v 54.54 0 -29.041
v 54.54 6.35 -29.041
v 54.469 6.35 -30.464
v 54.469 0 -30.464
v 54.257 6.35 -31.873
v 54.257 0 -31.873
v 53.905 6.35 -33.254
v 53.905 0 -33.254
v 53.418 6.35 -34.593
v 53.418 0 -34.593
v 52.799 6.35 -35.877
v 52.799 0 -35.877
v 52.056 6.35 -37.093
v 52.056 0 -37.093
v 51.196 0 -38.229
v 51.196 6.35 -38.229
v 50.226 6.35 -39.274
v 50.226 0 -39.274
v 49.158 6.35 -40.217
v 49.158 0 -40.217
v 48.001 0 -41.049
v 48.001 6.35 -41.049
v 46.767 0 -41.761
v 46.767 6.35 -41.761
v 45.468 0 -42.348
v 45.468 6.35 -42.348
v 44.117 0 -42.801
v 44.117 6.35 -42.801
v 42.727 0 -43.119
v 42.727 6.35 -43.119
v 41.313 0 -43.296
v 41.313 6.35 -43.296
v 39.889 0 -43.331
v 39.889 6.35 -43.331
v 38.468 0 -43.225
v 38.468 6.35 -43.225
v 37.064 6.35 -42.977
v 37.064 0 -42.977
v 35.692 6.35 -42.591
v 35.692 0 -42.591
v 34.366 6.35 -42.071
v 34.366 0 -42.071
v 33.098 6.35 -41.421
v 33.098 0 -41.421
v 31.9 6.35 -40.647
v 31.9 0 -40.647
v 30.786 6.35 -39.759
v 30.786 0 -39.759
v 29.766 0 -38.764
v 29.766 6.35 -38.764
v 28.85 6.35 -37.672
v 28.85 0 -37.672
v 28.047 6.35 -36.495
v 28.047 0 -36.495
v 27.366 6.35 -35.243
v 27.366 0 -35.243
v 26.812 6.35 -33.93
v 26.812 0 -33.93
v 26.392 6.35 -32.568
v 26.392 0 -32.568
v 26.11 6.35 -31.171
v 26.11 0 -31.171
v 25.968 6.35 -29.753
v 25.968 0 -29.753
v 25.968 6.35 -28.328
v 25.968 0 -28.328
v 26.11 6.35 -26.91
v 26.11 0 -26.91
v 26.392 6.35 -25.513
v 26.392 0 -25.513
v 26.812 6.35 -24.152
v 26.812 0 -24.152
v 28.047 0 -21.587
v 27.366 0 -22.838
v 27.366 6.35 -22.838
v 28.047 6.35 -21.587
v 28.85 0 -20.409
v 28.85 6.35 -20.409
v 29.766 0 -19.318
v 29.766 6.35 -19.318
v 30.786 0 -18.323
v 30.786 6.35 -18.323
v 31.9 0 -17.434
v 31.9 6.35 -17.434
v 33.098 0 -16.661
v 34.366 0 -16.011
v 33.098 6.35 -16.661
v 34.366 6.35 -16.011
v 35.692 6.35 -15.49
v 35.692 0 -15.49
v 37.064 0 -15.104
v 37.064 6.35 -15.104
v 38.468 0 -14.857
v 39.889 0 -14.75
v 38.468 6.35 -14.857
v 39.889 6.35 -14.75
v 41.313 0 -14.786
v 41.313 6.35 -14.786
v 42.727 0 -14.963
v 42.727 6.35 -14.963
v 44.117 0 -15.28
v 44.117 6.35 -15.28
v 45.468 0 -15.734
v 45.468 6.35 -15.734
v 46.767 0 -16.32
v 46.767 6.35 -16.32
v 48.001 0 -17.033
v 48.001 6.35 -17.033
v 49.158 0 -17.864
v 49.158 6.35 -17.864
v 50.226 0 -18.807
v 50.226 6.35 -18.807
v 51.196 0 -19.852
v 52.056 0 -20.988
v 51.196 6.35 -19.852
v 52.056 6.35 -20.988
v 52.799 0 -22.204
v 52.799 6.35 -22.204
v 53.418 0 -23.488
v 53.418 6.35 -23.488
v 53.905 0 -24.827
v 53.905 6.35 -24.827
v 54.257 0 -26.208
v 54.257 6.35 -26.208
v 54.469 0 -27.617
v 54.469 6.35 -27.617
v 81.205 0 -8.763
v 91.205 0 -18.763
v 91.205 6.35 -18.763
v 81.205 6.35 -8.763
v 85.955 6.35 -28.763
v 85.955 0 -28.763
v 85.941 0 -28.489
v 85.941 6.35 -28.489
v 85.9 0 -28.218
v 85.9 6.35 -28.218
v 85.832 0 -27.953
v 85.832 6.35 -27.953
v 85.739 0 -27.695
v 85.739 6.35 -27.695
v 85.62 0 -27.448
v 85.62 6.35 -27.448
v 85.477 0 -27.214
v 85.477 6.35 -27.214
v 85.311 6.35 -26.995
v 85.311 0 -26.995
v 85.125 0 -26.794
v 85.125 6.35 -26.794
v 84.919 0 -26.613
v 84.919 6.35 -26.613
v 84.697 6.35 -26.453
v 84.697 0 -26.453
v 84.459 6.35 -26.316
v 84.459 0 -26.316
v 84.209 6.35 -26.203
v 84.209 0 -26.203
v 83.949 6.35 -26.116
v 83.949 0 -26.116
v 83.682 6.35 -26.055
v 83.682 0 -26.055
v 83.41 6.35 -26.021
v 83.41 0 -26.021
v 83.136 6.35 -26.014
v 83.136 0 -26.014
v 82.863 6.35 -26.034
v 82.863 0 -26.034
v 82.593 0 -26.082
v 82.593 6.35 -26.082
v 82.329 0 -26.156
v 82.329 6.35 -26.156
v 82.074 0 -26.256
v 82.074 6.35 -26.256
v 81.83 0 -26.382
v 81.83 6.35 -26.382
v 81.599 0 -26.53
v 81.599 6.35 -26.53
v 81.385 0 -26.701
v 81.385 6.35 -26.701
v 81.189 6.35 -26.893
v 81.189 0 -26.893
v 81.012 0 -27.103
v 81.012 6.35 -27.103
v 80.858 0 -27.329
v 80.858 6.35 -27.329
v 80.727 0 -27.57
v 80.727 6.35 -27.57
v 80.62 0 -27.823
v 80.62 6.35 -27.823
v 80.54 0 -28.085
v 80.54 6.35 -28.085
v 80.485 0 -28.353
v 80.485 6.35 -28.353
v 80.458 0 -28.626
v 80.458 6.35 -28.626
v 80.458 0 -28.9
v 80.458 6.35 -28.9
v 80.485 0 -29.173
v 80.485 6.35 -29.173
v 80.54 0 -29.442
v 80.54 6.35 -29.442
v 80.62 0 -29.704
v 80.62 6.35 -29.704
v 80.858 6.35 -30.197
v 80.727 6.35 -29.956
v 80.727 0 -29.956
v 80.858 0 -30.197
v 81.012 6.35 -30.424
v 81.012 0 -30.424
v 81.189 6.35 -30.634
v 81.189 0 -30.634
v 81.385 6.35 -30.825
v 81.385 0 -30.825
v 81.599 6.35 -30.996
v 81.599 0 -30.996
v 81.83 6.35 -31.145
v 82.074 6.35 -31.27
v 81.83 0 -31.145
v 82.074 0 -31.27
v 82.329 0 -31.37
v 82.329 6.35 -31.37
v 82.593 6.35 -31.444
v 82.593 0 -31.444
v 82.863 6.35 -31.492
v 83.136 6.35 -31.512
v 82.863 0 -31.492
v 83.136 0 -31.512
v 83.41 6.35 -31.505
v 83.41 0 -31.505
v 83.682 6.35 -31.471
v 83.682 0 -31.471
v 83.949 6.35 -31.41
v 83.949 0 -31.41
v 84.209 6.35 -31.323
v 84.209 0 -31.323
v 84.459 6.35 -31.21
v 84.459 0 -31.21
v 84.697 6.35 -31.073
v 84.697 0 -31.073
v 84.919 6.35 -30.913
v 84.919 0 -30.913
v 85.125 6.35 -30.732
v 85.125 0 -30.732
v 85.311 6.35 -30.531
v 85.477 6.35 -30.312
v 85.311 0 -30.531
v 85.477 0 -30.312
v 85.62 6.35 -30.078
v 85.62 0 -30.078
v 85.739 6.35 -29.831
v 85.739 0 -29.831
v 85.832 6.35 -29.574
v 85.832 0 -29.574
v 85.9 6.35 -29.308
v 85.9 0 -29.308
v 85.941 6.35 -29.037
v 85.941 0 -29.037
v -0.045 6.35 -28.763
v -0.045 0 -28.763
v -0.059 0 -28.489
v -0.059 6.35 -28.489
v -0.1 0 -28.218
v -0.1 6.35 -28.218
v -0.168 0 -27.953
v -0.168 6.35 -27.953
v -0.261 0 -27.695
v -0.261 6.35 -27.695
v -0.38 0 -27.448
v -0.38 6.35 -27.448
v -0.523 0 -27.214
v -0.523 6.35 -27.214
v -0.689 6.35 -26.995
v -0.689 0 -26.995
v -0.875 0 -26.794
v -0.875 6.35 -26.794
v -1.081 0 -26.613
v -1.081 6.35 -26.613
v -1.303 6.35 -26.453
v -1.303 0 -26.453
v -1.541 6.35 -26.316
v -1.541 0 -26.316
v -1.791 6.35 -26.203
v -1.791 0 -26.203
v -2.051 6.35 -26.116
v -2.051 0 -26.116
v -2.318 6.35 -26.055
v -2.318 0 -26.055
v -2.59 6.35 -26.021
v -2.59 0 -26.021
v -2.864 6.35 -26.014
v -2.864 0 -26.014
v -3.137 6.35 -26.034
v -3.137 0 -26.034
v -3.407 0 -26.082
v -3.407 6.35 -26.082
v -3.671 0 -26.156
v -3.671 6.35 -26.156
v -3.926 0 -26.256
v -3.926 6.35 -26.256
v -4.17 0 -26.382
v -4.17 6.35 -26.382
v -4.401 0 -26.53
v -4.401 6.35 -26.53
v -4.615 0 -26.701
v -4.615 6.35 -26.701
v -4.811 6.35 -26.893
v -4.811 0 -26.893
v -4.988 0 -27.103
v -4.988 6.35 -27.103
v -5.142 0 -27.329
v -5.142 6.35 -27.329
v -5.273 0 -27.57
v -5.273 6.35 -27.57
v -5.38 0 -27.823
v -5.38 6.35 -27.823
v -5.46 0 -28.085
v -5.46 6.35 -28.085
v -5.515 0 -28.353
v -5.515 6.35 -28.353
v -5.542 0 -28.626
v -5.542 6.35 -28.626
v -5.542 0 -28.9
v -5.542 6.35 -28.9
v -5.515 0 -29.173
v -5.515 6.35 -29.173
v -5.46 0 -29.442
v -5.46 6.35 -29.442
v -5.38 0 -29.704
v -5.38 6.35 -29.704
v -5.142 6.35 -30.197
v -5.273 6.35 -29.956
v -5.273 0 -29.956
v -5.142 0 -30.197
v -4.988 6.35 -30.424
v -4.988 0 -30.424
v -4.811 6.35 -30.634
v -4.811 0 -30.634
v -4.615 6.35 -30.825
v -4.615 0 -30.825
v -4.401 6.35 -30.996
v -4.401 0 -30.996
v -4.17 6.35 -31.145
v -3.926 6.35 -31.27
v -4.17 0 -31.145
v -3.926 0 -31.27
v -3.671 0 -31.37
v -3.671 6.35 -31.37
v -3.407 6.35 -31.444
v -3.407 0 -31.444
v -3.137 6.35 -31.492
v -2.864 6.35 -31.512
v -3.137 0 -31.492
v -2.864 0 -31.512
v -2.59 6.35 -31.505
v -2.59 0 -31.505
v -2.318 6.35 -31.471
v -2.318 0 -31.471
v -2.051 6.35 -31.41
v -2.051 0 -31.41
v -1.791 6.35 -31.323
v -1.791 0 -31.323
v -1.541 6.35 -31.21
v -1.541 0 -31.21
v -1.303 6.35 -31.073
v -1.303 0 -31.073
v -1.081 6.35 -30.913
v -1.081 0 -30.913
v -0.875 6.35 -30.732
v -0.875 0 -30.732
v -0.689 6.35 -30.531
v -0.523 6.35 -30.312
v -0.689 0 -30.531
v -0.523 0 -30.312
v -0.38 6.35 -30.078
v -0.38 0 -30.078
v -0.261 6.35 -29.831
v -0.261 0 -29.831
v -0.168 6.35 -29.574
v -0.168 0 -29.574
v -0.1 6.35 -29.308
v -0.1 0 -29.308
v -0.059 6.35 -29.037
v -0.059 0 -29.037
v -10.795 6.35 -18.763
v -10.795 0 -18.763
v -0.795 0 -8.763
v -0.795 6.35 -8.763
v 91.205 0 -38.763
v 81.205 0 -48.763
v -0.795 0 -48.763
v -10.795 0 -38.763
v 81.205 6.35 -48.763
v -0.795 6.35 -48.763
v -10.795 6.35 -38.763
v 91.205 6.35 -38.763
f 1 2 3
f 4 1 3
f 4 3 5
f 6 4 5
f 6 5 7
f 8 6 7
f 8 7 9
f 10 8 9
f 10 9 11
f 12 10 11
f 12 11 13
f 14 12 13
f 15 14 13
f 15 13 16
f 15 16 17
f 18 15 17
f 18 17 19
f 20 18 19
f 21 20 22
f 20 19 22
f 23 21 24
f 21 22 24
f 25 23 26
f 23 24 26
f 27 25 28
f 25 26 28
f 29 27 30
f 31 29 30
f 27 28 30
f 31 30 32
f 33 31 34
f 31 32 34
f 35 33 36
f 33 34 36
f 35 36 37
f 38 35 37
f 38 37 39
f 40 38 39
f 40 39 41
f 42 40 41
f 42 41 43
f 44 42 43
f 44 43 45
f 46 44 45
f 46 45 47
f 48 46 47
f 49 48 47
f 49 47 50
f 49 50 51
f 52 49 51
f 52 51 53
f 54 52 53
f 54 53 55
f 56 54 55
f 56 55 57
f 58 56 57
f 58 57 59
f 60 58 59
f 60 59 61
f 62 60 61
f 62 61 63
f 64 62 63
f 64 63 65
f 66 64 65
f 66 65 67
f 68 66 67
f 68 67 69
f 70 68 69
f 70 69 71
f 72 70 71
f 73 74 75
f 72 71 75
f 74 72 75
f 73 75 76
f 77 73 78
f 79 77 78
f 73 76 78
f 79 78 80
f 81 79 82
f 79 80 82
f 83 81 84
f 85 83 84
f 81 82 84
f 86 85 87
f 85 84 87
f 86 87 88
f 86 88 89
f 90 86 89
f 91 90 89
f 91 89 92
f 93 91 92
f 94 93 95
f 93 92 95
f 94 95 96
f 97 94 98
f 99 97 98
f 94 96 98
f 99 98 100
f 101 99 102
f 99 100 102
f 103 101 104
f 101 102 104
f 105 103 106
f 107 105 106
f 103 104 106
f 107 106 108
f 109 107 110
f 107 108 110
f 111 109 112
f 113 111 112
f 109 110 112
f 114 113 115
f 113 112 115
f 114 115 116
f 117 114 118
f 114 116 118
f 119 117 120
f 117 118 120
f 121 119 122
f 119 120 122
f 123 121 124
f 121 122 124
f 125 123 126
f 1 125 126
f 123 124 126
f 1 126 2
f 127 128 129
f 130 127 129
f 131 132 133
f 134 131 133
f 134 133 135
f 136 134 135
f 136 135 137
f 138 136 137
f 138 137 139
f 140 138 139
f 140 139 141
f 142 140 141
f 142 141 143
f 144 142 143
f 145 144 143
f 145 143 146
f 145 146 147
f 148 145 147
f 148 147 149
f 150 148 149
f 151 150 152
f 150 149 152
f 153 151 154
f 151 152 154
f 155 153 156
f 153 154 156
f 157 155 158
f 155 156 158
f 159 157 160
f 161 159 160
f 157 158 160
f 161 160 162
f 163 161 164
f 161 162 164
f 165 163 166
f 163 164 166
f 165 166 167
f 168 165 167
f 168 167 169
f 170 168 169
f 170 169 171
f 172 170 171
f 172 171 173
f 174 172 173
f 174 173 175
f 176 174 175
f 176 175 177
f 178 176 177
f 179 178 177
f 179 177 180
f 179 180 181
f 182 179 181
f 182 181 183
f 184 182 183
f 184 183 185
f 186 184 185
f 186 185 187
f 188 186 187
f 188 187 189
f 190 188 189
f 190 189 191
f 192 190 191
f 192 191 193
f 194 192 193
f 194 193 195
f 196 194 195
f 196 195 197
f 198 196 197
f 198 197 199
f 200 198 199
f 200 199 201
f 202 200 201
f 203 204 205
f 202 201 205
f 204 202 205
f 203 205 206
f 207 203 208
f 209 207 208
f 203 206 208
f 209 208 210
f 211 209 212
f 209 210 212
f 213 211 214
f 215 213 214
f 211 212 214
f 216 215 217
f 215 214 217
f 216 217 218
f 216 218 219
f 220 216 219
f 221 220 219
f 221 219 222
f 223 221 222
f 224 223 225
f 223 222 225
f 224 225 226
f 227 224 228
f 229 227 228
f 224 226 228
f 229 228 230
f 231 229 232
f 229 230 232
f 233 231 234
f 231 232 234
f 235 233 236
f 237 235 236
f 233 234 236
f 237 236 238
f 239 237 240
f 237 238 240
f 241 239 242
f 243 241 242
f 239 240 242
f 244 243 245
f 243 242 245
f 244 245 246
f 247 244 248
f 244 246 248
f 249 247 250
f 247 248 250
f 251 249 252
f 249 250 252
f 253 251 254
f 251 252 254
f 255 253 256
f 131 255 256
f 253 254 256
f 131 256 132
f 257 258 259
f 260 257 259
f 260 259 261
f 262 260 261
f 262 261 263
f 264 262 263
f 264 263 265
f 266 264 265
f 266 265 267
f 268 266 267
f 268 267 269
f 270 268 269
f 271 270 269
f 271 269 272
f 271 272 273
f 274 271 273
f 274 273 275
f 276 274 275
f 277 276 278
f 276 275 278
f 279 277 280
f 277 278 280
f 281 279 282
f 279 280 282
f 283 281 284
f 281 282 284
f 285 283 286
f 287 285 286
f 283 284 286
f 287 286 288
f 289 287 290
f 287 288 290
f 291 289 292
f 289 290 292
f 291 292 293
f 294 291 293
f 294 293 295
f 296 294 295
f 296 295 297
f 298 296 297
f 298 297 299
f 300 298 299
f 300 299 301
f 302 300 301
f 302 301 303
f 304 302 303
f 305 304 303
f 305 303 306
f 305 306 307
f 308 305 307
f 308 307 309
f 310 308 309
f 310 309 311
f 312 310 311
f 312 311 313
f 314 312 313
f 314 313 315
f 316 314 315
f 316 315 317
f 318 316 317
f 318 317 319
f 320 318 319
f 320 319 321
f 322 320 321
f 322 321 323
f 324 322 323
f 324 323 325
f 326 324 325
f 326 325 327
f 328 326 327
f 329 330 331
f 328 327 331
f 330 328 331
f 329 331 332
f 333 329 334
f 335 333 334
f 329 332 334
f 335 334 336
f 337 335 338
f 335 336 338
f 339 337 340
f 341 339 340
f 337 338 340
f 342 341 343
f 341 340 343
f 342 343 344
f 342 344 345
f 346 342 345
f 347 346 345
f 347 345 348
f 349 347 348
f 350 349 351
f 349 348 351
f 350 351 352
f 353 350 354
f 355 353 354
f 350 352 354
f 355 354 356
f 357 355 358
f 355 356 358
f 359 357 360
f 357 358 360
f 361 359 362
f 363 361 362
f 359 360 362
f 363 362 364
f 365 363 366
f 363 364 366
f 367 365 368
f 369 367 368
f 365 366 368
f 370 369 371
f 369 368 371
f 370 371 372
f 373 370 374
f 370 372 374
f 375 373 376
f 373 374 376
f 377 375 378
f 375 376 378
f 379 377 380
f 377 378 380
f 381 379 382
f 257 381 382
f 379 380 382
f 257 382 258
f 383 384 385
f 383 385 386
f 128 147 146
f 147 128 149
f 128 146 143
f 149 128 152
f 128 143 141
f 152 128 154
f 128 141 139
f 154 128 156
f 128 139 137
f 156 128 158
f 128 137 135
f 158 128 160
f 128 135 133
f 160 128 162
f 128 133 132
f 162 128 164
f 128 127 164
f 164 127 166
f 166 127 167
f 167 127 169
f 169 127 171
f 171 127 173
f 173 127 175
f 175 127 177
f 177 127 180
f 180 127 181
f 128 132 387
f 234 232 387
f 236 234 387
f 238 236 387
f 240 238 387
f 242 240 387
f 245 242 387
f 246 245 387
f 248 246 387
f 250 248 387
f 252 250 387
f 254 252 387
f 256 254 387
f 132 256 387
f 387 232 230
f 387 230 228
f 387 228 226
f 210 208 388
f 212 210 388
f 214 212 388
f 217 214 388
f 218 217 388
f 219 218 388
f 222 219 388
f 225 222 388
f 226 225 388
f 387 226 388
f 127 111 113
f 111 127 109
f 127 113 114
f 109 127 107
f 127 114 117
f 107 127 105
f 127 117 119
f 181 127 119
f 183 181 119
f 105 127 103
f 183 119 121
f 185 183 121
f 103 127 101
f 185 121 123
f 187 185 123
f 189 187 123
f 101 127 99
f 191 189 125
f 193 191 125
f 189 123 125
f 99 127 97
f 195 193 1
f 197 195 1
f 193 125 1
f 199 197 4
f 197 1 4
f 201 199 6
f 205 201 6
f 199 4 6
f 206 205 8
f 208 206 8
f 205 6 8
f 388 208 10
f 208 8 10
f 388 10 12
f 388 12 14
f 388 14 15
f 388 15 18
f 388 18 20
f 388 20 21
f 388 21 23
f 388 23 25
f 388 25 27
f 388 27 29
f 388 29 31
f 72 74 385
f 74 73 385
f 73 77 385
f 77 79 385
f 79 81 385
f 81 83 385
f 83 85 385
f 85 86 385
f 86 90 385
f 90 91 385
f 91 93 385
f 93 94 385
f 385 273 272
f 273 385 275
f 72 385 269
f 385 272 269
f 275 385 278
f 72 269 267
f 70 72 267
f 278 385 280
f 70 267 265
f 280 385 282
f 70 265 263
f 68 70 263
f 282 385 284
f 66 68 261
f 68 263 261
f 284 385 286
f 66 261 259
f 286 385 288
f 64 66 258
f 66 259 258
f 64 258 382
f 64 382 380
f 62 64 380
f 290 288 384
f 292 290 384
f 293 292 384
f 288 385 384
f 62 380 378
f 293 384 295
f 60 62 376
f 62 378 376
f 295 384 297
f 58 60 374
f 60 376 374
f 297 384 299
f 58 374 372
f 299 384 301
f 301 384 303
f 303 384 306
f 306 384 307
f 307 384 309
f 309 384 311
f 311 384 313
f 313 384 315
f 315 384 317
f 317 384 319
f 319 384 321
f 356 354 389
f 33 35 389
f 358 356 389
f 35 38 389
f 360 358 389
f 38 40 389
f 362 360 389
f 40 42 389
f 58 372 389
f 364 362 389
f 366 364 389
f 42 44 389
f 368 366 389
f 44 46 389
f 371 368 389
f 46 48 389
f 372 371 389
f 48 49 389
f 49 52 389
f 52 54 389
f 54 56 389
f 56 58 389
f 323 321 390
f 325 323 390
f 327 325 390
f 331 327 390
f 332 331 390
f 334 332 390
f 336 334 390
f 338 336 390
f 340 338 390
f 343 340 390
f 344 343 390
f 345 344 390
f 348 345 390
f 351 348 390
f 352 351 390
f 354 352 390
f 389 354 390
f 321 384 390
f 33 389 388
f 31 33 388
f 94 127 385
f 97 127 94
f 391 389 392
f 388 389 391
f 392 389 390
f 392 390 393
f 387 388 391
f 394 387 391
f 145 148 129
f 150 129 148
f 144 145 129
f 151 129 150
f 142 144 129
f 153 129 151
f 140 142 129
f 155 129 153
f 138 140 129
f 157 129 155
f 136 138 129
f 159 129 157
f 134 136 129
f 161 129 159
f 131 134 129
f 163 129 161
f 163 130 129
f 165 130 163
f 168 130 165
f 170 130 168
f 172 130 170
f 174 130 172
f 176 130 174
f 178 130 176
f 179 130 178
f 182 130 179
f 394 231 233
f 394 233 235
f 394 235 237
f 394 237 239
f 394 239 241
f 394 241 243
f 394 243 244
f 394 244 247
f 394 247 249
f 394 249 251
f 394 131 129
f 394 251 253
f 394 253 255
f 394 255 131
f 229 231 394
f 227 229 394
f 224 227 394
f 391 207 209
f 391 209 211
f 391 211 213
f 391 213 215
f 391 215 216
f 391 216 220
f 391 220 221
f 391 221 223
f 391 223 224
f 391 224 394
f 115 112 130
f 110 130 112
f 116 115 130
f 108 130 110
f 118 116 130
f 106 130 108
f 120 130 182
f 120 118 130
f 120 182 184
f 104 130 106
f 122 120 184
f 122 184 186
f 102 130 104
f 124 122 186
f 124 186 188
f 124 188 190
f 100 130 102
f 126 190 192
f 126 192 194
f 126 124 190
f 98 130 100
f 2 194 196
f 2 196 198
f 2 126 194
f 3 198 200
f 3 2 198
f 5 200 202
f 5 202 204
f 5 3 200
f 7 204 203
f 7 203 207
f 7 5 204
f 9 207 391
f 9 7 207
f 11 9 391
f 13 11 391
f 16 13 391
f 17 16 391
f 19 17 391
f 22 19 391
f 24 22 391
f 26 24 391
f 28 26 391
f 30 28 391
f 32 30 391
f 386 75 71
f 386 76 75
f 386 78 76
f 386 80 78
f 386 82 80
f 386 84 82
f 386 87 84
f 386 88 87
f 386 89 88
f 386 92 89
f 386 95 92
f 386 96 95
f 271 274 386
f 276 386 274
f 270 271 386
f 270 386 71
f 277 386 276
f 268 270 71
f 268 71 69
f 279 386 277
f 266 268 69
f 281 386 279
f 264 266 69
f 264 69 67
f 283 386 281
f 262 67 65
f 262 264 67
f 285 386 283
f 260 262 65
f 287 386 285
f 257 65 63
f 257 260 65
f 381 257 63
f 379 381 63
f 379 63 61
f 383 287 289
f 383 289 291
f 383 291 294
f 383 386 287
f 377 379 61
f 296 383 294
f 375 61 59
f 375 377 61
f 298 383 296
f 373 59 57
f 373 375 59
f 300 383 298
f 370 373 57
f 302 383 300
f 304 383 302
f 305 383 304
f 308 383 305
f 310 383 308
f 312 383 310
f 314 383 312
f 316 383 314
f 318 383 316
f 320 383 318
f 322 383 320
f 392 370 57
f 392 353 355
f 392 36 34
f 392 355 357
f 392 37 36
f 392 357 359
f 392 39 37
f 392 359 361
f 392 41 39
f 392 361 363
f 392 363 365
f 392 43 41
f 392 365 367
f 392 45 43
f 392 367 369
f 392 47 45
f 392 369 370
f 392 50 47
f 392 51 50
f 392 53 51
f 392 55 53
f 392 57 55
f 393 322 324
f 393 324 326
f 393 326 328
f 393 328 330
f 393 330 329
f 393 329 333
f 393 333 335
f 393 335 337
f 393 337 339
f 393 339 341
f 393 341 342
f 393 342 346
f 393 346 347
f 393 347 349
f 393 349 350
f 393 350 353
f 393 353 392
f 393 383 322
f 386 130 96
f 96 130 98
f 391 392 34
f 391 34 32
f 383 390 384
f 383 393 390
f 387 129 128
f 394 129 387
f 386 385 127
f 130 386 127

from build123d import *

# Parameters (mm, degrees)
SKETCH1_W           = 82
SKETCH1_H           = 70
BOSS_EXTRUDE1_DEPTH = 6.35
SKETCH4_R           = 14.295
CUT_EXTRUDE3_DEPTH  = 7.35
SKETCH7_W           = 70
SKETCH7_H           = 6.35
BOSS_EXTRUDE2_DEPTH = 10
SKETCH8_W           = 70
SKETCH8_H           = 6.35
BOSS_EXTRUDE3_DEPTH = 10
SKETCH6_R           = 2.75
CUT_EXTRUDE4_DEPTH  = 10
CHAMFER1_SIZE       = 25
SKETCH9_OUTSIDE_W   = 128.774
SKETCH9_OUTSIDE_H   = 96.774
SKETCH9_OUTSIDE_W_2 = 112.086128576
SKETCH9_OUTSIDE_H_2 = 40
CUT_EXTRUDE6_DEPTH  = 6.35


with BuildPart() as part:
    # Sketch1 → Boss-Extrude1 (new body)
    with BuildSketch(Plane(origin=(0, 0, 0), x_dir=(1, 0, 0), z_dir=(0, 1, 0))):
        with Locations((40.204600864, 28.763107794)):
            Rectangle(SKETCH1_W, SKETCH1_H)
    extrude(amount=BOSS_EXTRUDE1_DEPTH)

    # Sketch4 → Cut-Extrude3 (cut, through all)
    with BuildSketch(Plane(origin=(0, 6.35, 0), x_dir=(1, 0, 0), z_dir=(0, 1, 0))):
        with Locations((40.245025705, 29.040694999)):
            Circle(SKETCH4_R)
    extrude(amount=-CUT_EXTRUDE3_DEPTH, mode=Mode.SUBTRACT)

    # Sketch7 → Boss-Extrude2 (add)
    with BuildSketch(Plane.ZY.offset(0.795399136)):
        with Locations((-28.763107794, 3.175)):
            Rectangle(SKETCH7_W, SKETCH7_H)
    extrude(amount=BOSS_EXTRUDE2_DEPTH)

    # Sketch8 → Boss-Extrude3 (add)
    with BuildSketch(Plane(origin=(81.204600864, 0, 0), x_dir=(0, 0, -1), z_dir=(1, 0, 0))):
        with Locations((28.763107794, 3.175)):
            Rectangle(SKETCH8_W, SKETCH8_H)
    extrude(amount=BOSS_EXTRUDE3_DEPTH)

    # Sketch6 → Cut-Extrude4 (cut)
    with BuildSketch(Plane.XZ):
        with Locations((-2.795399136, -28.763107793)):
            Circle(SKETCH6_R)
        with Locations((83.204600864, -28.763107784)):
            Circle(SKETCH6_R)
    extrude(amount=-CUT_EXTRUDE4_DEPTH, mode=Mode.SUBTRACT)

    # Chamfer1
    chamfer1_edges = [part.edges().sort_by_distance(p)[0] for p in [
        (-10.795399136, 3.175, 6.236892206),
        (-10.795399136, 3.175, -63.763107794),
        (91.204600864, 3.175, 6.236892206),
        (91.204600864, 3.175, -63.763107794),
    ]]
    chamfer(chamfer1_edges, length=CHAMFER1_SIZE)

    # Sketch9 outside → Cut-Extrude6 (cut)
    with BuildSketch(Plane.XZ):
        with Locations((40.205, -28.763)):
            Rectangle(SKETCH9_OUTSIDE_W, SKETCH9_OUTSIDE_H)
        with Locations((41.847145894, -28.763107784)):
            Rectangle(SKETCH9_OUTSIDE_W_2, SKETCH9_OUTSIDE_H_2, mode=Mode.SUBTRACT)
    extrude(amount=-CUT_EXTRUDE6_DEPTH, mode=Mode.SUBTRACT)


solid = part.part
